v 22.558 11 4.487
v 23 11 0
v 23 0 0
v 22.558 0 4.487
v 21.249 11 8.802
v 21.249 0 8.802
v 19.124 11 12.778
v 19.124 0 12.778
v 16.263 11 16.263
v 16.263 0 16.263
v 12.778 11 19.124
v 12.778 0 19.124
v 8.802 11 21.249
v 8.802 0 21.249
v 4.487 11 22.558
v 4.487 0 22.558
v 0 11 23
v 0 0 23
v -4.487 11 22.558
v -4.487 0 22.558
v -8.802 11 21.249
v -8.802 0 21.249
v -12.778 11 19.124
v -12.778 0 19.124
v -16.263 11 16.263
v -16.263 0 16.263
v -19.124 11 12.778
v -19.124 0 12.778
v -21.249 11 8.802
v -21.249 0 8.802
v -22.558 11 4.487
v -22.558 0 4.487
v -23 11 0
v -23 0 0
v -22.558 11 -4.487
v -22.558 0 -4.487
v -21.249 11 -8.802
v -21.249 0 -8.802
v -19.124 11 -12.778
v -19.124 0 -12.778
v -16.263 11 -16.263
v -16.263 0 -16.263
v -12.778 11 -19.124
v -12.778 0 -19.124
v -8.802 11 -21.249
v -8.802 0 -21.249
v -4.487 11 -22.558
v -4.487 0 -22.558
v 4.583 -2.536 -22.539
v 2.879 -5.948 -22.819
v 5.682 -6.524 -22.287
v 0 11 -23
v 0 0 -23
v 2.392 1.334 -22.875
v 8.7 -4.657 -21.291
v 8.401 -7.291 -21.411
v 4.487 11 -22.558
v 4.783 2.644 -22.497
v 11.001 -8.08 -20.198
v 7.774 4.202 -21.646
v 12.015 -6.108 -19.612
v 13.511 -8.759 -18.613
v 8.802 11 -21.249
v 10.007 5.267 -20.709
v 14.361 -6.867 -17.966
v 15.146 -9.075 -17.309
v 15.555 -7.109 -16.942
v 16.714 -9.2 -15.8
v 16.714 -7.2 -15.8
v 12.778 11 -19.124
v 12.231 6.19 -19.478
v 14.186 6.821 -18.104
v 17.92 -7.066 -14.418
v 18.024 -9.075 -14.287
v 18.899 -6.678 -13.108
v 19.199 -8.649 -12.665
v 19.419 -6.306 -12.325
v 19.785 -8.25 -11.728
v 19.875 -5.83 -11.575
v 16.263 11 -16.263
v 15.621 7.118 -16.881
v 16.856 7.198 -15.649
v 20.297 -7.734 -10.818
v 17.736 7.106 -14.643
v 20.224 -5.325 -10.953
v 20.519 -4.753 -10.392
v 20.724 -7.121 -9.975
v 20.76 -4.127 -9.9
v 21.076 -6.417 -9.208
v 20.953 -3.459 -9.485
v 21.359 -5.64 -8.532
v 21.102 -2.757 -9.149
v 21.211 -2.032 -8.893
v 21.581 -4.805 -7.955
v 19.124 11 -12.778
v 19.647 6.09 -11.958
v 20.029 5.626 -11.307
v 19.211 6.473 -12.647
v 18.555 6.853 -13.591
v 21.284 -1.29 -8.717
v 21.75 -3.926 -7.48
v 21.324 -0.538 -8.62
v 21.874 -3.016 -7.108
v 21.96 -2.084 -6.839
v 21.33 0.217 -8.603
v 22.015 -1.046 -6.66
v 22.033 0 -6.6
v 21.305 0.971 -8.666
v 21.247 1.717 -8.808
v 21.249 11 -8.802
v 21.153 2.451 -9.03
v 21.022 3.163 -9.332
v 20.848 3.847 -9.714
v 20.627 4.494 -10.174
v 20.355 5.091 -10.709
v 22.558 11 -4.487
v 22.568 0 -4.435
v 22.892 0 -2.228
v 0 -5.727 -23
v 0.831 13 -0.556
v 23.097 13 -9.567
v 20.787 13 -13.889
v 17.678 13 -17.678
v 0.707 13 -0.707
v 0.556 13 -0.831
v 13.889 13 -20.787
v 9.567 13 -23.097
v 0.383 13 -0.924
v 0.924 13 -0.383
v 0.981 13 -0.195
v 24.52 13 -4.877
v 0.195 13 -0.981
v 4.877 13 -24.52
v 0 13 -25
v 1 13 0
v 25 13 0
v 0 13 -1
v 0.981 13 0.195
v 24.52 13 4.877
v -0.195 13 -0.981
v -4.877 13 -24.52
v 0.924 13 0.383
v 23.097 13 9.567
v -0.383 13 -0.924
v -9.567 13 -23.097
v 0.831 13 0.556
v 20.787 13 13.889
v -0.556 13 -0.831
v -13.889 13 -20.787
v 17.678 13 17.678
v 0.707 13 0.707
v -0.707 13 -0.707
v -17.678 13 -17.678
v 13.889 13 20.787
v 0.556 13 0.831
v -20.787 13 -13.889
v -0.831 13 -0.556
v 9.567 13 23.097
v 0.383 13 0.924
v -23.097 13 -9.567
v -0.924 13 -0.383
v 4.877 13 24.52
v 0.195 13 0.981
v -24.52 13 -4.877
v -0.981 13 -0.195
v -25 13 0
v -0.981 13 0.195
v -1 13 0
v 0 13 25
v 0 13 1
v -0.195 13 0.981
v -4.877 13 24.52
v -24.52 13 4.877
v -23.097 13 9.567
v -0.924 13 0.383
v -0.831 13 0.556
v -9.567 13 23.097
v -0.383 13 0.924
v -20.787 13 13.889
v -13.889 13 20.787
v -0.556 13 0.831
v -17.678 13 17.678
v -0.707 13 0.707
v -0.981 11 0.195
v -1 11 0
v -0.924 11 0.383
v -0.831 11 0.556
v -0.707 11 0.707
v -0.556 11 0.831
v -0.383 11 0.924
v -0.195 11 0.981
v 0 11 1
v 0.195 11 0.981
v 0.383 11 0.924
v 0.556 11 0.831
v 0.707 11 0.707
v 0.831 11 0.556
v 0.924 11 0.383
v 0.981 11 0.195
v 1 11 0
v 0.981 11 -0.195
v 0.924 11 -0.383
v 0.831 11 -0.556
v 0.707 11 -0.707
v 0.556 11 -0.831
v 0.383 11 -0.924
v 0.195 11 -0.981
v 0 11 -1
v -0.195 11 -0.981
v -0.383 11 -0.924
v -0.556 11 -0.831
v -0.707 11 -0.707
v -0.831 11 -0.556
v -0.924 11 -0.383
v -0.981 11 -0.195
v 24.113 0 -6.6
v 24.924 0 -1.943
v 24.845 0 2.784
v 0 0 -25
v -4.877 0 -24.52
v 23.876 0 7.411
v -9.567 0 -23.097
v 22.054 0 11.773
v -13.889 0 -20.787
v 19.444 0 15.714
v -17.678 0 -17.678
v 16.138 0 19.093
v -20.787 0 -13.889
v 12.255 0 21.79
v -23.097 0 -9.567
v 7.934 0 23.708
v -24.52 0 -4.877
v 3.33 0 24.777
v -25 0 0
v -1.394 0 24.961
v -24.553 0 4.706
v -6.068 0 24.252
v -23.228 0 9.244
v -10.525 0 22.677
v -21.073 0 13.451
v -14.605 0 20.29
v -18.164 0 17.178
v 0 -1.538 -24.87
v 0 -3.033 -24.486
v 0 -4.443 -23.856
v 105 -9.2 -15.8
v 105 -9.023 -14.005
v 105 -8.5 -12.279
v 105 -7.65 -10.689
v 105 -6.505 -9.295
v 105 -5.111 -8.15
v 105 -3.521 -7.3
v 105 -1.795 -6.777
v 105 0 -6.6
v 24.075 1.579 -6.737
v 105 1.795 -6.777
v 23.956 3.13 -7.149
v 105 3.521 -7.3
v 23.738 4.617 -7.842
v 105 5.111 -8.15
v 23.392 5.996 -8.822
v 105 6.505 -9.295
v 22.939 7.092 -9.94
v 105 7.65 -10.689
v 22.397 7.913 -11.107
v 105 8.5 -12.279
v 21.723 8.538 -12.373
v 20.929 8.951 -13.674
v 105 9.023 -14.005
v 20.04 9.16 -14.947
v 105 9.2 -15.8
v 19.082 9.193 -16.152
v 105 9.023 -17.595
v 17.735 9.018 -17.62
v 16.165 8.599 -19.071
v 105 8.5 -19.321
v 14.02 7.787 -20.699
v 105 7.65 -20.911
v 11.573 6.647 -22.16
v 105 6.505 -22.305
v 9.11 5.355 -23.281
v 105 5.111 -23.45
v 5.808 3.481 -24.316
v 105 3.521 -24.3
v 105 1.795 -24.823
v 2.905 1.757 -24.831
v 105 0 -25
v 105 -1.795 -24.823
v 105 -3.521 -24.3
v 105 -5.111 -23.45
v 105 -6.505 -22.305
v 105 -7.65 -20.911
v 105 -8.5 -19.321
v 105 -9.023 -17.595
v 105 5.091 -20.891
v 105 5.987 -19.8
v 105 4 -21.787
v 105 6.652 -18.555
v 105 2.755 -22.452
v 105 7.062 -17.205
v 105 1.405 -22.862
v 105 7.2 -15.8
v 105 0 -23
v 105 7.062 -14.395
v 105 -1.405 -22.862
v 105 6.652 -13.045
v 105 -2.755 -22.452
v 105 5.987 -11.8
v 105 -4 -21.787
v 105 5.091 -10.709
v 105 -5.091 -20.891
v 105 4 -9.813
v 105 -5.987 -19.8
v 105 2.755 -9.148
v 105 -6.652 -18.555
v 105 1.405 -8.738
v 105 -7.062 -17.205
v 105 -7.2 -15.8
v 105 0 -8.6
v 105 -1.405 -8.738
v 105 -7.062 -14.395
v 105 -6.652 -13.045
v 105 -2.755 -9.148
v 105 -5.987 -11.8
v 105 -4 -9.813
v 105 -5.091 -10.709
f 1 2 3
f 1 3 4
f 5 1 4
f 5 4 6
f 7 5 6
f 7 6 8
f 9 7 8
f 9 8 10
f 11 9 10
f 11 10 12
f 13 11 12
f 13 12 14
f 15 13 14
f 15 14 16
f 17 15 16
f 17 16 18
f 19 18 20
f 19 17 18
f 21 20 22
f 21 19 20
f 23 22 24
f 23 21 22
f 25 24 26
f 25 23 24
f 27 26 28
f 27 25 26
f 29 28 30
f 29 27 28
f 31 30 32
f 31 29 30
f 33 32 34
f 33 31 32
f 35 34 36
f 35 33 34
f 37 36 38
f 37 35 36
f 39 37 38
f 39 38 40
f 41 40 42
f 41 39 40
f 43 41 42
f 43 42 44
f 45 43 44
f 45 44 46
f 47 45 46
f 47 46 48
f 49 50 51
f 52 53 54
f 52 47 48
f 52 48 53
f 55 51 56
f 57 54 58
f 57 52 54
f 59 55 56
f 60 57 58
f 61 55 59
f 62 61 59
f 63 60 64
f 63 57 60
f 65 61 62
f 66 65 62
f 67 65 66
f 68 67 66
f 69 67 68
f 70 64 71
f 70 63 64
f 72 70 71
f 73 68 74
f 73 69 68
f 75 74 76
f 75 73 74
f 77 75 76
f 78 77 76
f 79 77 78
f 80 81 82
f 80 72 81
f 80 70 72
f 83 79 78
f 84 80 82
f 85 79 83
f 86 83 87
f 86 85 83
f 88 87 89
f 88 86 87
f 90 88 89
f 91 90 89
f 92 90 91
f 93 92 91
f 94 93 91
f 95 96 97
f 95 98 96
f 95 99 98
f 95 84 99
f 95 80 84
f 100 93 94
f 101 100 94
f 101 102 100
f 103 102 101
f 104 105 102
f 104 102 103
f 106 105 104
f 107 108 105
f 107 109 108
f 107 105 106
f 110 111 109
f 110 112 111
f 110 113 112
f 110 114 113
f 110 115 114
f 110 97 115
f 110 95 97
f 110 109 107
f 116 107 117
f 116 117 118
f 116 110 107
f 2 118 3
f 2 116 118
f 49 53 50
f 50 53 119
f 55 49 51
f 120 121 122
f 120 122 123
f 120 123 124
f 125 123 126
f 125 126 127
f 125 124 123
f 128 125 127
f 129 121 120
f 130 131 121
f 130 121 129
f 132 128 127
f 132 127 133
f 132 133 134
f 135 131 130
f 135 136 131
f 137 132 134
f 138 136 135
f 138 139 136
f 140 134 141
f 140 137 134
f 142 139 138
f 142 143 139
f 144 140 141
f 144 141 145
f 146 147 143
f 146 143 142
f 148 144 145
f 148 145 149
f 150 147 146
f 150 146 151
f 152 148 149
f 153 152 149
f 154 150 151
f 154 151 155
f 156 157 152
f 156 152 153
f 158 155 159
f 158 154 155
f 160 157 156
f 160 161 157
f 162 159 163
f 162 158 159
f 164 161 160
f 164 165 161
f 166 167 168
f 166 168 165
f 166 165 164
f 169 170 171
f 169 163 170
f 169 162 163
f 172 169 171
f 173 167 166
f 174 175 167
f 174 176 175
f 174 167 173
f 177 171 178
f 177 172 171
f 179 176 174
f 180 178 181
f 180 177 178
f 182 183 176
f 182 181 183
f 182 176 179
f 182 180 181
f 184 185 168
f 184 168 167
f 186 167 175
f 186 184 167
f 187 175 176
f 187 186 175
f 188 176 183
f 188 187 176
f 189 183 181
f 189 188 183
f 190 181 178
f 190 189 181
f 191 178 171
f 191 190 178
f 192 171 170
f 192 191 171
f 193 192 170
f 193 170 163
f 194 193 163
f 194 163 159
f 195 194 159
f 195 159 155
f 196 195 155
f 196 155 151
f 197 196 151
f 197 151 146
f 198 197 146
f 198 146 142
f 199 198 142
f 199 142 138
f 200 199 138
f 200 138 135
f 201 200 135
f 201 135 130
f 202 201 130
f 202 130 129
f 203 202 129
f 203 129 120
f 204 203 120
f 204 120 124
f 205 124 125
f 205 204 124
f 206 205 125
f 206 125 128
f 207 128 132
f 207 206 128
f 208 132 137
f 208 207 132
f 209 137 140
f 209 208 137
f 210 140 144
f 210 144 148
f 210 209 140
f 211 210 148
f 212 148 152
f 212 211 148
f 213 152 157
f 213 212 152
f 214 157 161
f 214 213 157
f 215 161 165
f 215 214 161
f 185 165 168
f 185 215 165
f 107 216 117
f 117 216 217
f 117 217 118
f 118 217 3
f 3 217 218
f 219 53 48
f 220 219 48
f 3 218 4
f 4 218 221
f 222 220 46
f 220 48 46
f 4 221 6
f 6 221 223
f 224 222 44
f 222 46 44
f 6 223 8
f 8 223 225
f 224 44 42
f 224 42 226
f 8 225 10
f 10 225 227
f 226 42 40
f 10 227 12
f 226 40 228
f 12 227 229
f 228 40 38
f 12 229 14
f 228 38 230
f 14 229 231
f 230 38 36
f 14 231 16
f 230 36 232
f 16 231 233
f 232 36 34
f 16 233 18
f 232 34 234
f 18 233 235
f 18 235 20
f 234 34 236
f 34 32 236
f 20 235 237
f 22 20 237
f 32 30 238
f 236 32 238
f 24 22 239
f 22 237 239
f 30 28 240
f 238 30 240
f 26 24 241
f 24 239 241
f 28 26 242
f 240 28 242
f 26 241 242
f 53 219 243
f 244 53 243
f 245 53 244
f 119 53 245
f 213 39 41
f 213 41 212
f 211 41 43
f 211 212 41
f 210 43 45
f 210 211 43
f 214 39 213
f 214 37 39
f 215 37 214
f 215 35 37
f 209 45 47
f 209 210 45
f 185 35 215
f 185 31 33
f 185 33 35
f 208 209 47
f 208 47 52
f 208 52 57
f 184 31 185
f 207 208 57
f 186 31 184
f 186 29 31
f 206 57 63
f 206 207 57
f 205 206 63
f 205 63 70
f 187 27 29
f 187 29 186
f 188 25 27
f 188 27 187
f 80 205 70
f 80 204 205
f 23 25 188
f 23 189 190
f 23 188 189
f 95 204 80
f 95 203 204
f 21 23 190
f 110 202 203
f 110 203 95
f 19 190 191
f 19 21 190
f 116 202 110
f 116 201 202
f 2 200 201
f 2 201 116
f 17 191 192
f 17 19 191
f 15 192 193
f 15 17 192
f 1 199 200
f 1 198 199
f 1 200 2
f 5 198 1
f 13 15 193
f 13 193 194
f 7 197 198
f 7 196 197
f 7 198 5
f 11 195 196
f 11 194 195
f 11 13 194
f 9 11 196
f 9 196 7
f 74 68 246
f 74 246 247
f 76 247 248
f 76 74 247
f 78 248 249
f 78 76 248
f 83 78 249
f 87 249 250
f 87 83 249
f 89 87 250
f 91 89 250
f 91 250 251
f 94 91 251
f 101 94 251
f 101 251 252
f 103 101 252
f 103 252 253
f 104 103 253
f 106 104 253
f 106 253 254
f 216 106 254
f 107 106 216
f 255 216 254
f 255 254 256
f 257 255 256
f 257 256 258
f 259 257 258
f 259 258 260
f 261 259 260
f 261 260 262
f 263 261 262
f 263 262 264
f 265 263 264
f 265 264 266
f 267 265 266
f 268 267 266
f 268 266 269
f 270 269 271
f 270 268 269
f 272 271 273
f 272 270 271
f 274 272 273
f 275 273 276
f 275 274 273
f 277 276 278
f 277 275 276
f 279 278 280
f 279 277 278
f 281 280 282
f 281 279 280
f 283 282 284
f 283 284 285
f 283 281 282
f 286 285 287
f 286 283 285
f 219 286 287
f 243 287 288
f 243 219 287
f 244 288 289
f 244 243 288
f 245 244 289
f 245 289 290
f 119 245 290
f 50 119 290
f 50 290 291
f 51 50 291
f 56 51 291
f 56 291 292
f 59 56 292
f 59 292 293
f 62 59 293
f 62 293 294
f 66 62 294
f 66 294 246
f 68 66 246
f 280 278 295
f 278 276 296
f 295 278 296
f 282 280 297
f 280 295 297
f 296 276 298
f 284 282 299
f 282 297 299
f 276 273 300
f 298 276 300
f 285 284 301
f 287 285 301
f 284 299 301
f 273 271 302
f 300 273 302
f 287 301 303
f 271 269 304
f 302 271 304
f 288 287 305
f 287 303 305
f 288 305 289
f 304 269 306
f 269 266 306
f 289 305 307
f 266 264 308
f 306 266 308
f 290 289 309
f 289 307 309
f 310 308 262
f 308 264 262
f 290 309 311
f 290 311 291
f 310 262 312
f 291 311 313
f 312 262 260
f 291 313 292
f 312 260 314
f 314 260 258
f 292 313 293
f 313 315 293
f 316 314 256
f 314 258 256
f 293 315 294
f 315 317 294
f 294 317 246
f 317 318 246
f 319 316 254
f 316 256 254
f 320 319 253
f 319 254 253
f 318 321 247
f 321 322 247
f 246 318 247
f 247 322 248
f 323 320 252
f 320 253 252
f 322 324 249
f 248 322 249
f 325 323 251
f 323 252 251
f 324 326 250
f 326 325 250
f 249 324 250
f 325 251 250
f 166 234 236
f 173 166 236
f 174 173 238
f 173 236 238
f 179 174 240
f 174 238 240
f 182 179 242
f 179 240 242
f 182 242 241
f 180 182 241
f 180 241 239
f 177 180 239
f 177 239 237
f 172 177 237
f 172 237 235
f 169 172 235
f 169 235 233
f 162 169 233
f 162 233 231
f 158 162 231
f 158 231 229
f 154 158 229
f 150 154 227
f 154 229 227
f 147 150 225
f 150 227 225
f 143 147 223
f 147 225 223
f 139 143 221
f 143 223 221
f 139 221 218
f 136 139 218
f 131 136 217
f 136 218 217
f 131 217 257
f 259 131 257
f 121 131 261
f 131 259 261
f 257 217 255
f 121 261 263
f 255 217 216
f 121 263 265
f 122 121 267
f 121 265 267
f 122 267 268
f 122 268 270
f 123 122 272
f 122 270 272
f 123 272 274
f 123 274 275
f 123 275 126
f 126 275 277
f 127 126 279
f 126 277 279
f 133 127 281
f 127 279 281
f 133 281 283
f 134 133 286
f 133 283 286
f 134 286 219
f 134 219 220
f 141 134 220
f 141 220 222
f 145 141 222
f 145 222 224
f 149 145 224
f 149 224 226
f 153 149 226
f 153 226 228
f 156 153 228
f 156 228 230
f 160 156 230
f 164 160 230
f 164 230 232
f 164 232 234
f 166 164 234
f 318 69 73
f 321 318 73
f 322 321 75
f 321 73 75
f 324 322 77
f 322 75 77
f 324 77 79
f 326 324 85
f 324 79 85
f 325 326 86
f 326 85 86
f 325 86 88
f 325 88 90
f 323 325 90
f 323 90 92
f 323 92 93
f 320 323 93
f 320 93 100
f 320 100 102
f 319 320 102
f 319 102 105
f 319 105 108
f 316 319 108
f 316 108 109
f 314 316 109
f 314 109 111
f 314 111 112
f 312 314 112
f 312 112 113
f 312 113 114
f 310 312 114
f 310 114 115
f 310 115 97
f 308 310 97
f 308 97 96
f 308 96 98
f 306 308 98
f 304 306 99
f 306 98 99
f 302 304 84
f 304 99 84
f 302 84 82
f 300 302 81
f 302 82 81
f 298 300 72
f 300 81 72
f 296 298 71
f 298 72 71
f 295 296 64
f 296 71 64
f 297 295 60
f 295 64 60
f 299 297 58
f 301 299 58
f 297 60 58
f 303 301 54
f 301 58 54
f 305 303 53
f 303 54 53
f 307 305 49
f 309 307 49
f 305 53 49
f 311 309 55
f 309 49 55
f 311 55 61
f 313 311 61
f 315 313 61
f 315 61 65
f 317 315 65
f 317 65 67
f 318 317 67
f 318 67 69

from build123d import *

# Parameters (mm, degrees)
F0_R      = 25
F0_R_2    = 1
F1_DEPTH  = 13
F2_R      = 23
F3_DEPTH  = 11
F4_R      = 9.2
F4_R_2    = 7.2
F5_DEPTH  = 105
F6_DEPTH  = 50.8
F7_DEPTH  = 25.4
F8_R      = 23
F9_DEPTH  = 25.4
F11_ANGLE = 180


with BuildPart() as f1:
    # F0 (on Front) → F1 (new body)
    with BuildSketch(Plane.XZ):
        Circle(F0_R)
        Circle(F0_R_2, mode=Mode.SUBTRACT)
    extrude(amount=F1_DEPTH)

    # F2 (on face) → F3 (cut)
    with BuildSketch(Plane(origin=(0, 0, 0), x_dir=(-1, 0, 0), z_dir=(0, 1, 0))):
        Circle(F2_R)
    extrude(amount=-F3_DEPTH, mode=Mode.SUBTRACT)

    # F4 (on Right) → F5 (join)
    with BuildSketch(Plane.YZ):
        with Locations((0, -15.8)):
            Circle(F4_R)
        with Locations((0, -15.8)):
            Circle(F4_R_2, mode=Mode.SUBTRACT)
    extrude(amount=-F5_DEPTH)

    # F4 (on Right) → F6 (cut)
    with BuildSketch(Plane.YZ):
        with Locations((0, -15.8)):
            Circle(F4_R_2)
    extrude(amount=-F6_DEPTH, mode=Mode.SUBTRACT)

    # F0 (on Front) → F7 (cut)
    with BuildSketch(Plane.XZ):
        Circle(F0_R_2)
    extrude(amount=-F7_DEPTH, mode=Mode.SUBTRACT)

    # F8 (on face) → F9 (cut)
    with BuildSketch(Plane(origin=(0, -11, 0), x_dir=(-1, 0, 0), z_dir=(0, 1, 0))):
        Circle(F8_R)
    extrude(amount=F9_DEPTH, mode=Mode.SUBTRACT)


with BuildPart() as f1_1:
    # F11: moved
    add(f1.part.rotate(Axis((0, 0, 3.9728134871), (0, 0, -1)), F11_ANGLE))


solid = f1_1.part
